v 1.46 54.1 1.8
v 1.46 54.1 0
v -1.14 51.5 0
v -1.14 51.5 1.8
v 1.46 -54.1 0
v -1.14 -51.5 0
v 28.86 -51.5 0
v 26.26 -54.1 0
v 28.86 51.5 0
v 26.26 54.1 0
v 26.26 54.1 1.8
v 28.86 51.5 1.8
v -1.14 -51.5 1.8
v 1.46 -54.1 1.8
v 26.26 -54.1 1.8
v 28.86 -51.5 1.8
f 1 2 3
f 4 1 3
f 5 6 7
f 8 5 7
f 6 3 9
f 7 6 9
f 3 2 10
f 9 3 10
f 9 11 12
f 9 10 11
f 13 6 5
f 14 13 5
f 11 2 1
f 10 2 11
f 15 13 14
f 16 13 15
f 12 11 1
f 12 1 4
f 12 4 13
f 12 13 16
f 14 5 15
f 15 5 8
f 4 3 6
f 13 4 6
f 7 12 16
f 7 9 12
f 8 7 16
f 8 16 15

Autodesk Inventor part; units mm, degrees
ref_plane "YZ Plane" through (0, 0, 0) normal (1, 0, 0) x (0, 1, 0)
ref_plane "XZ Plane" through (0, 0, 0) normal (0, 1, 0) x (-1, 0, 0)
ref_plane "XY Plane" through (0, 0, 0) normal (0, 0, 1) x (1, 0, 0)
sketch "Sketch1" plane through (0, 0, 0) normal (0, 0, 1) x (1, 0, 0)
  arc A0 (6.9595, 53) -> (8.4595, 54.5) centre (6.9595, 54.5) ccw projected
  line L0 (1.4595, 54.5) -> (8.4595, 54.5) projected
  arc A1 (1.4595, 54.5) -> (-1.5405, 51.5) centre (1.4595, 51.5) ccw projected
  line L1 (-1.5405, -51.5) -> (-1.5405, 51.5) projected
  arc A2 (-1.5405, -51.5) -> (1.4595, -54.5) centre (1.4595, -51.5) ccw projected
  line L2 (8.4595, -54.5) -> (1.4595, -54.5) projected
  arc A3 (8.4595, -54.5) -> (6.9595, -53) centre (6.9595, -54.5) ccw projected
  line L3 (1.4595, -53) -> (6.9595, -53) projected
  arc A4 (-0.0405, -51.5) -> (1.4595, -53) centre (1.4595, -51.5) ccw projected
  line L4 (-0.0405, 51.5) -> (-0.0405, -51.5) projected
  arc A5 (1.4595, 53) -> (-0.0405, 51.5) centre (1.4595, 51.5) ccw projected
  line L5 (6.9595, 53) -> (1.4595, 53) projected
  arc A6 (1.4595, 54.1) -> (-1.1405, 51.5) centre (1.4595, 51.5) ccw construction
  line L6 (1.4595, 54.1) -> (26.2595, 54.1)
  line L7 (-1.1405, 51.5) -> (-1.1405, -51.5)
  arc A7 (-1.1405, -51.5) -> (1.4595, -54.1) centre (1.4595, -51.5) ccw construction
  line L8 (1.4595, -54.1) -> (26.2595, -54.1)
  line L9 (-1.1405, -51.5) -> (1.4595, -54.1)
  line L10 (1.4595, 54.1) -> (-1.1405, 51.5)
  line L11 (26.2595, 54.1) -> (28.8595, 51.5)
  line L12 (28.8595, 51.5) -> (28.8595, -51.5)
  line L13 (28.8595, -51.5) -> (26.2595, -54.1)
  point P0 (0, 0)
  dimension "d0" = 0.4
  dimension "d1" = 30
extrude "Extrusion1" add sketch "Sketch1" along normal blind 1.8 contours L5 A5 L4 A4 L3 A3 L8 L9 L7 L10 L6 A0 | A0 L6 L11 L12 L13 L8 A3 L3 A4 L4 A5 L5
properties part number "multiplier_pcb" material "Phenolic Resin"
